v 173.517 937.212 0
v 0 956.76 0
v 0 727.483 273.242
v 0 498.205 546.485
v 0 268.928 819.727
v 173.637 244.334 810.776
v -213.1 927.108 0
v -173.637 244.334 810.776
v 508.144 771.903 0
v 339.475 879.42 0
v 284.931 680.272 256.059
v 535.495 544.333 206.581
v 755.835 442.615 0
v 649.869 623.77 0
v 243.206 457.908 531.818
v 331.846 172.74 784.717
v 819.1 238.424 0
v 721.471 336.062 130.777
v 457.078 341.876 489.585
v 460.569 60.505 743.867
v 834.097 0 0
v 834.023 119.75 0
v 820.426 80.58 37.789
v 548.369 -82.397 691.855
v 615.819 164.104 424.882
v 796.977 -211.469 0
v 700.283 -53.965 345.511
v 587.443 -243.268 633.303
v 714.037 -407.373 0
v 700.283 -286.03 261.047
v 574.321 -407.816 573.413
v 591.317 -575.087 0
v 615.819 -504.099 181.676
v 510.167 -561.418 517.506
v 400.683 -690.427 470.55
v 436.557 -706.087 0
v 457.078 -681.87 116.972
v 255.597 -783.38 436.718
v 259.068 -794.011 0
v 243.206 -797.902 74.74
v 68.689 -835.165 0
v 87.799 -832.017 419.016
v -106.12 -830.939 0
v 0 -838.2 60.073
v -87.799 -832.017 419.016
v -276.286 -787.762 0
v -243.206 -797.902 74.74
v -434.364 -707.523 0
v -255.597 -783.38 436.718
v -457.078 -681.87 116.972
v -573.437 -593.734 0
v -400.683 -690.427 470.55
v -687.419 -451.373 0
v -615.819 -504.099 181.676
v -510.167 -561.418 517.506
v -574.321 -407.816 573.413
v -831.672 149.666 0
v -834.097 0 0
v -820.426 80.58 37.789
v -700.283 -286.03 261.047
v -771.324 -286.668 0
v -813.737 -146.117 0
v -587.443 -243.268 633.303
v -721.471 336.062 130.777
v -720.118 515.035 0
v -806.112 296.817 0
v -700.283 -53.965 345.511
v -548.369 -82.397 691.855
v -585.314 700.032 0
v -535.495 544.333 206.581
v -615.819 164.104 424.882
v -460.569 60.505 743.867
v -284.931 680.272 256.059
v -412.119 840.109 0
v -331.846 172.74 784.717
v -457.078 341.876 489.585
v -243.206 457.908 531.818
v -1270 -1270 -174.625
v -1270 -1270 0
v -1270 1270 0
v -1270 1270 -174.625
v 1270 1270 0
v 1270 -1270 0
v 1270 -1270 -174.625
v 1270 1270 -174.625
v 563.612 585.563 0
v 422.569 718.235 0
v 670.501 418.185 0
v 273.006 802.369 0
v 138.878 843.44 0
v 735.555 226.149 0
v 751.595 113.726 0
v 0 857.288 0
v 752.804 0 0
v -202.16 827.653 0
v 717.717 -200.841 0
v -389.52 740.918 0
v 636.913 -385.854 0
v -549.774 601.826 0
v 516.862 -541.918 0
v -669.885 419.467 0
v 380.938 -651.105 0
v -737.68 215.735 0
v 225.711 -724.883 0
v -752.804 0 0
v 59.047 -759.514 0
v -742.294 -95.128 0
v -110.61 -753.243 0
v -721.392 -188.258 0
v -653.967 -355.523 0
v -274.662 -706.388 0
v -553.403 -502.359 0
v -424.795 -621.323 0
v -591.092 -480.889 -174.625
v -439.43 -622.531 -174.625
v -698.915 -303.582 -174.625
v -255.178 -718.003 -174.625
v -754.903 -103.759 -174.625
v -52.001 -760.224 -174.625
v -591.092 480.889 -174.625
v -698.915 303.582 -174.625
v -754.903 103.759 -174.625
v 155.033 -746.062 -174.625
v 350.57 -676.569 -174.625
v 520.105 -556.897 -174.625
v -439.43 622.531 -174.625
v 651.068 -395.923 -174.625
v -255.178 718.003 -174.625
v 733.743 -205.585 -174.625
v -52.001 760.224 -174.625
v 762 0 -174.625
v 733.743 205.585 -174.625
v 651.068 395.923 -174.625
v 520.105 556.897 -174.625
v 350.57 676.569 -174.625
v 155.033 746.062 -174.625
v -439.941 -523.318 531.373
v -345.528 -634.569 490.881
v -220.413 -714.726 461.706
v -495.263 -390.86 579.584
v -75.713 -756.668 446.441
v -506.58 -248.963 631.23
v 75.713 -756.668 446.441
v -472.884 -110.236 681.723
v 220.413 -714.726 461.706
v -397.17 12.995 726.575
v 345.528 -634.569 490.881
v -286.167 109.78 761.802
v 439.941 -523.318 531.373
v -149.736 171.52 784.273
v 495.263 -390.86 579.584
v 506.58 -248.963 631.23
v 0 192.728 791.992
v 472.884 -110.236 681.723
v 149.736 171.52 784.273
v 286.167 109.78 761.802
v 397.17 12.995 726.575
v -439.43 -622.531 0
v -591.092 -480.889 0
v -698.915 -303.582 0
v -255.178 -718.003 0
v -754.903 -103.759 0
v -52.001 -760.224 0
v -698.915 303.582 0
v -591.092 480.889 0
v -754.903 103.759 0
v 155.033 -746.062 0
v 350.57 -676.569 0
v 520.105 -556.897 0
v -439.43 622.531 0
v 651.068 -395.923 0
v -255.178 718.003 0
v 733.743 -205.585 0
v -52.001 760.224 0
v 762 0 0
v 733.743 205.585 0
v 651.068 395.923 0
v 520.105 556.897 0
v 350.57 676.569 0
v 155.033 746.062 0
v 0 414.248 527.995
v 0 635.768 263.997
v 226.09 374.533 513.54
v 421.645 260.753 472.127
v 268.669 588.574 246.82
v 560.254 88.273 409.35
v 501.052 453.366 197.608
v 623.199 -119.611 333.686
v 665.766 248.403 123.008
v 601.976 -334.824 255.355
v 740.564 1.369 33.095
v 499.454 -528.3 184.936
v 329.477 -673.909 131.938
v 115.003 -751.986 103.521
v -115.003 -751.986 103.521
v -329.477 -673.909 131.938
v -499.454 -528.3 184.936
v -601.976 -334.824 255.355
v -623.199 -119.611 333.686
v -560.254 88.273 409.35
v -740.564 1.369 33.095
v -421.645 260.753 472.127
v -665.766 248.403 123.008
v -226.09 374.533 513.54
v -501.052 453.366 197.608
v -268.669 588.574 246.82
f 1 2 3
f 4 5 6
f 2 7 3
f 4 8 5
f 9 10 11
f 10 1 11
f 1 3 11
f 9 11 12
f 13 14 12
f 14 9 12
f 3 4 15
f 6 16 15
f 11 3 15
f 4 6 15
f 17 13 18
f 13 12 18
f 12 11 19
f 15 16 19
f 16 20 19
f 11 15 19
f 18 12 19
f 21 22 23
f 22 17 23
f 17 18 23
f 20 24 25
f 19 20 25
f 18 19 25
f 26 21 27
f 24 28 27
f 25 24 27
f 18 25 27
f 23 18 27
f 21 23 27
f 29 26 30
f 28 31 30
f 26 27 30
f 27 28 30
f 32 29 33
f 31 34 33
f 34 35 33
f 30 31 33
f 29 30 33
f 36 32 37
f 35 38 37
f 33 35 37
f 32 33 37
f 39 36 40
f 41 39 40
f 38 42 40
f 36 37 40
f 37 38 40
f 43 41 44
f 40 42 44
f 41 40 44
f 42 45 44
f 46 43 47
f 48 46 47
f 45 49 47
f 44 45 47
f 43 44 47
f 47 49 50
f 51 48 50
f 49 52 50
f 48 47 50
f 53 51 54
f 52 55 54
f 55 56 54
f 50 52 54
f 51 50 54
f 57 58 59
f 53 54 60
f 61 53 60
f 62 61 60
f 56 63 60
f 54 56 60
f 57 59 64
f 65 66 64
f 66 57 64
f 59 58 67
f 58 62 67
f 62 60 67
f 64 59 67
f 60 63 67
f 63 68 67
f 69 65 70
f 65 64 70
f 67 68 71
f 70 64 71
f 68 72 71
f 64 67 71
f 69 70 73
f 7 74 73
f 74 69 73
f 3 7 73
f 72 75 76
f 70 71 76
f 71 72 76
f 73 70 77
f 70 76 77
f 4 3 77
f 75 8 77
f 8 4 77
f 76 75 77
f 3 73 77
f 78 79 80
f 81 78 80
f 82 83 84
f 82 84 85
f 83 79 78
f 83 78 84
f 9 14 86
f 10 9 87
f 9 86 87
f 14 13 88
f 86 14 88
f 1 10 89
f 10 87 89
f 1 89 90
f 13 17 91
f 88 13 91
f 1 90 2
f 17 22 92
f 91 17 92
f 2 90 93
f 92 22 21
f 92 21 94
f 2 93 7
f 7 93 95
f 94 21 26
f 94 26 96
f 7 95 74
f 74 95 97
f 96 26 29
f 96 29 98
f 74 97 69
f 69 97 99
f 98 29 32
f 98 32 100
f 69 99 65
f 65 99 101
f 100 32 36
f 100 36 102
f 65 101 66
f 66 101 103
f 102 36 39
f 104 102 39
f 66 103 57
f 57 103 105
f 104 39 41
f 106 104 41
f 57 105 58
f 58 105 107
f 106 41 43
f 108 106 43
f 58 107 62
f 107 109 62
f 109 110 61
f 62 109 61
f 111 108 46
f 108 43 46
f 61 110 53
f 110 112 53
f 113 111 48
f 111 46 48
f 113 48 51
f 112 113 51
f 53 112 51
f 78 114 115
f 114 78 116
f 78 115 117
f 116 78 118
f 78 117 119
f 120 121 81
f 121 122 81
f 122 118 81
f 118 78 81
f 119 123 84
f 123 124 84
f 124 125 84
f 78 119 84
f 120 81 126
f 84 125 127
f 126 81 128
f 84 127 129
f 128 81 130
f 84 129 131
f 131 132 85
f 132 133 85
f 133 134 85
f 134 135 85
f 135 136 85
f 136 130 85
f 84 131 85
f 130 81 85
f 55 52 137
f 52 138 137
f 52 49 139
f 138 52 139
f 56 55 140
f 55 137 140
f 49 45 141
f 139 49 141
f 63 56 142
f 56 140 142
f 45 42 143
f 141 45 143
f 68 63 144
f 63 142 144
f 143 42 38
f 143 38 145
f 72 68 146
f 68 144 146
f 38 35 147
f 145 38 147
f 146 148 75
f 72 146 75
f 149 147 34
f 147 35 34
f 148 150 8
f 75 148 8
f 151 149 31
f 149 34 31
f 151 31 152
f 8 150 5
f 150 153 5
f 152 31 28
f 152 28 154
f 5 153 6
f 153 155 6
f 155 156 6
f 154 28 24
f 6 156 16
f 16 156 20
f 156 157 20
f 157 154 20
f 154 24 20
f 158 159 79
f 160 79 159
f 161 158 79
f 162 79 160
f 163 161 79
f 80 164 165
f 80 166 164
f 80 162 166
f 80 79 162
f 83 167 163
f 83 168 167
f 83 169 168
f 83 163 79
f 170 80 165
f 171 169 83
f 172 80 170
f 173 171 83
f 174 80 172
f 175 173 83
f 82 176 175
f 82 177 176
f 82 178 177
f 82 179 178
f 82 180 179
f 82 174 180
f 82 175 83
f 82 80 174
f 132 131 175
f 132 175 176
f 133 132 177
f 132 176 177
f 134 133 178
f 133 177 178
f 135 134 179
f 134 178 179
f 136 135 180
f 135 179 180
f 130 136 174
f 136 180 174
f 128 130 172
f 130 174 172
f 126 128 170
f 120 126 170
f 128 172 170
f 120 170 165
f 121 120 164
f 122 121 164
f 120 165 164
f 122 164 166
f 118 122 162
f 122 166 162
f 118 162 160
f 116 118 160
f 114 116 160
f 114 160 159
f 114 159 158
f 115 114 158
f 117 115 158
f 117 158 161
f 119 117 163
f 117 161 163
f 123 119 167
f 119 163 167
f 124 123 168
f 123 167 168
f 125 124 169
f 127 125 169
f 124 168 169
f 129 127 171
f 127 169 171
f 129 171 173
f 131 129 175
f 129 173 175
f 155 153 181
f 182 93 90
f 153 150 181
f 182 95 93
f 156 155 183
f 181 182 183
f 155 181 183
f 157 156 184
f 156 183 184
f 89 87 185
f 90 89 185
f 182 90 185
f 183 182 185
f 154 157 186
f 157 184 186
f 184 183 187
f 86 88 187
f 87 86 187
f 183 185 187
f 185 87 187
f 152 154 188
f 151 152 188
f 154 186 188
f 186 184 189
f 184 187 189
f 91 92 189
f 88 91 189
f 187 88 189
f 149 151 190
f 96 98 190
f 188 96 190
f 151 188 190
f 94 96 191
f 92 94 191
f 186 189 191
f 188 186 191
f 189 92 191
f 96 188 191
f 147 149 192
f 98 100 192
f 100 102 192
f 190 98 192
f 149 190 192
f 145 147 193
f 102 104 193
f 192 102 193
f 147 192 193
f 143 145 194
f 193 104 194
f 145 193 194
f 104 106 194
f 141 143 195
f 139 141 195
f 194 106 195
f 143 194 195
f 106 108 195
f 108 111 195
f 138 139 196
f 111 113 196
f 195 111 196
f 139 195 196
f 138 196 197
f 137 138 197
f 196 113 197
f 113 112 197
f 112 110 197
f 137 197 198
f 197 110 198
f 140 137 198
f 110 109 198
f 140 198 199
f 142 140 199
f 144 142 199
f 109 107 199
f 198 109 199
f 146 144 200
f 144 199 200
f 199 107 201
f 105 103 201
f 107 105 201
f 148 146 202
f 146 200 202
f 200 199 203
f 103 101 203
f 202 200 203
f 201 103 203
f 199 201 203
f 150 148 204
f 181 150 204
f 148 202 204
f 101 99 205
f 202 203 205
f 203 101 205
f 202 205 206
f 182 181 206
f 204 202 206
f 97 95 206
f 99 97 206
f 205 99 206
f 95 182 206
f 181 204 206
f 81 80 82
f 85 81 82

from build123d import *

# Parameters (mm, degrees)
F8_DEPTH      = 956.7613239616
F8_DEPTH_BACK = 838.201
F9_W          = 2540
F9_H          = 2540
F9_R          = 762
F10_DEPTH     = 174.625


with BuildPart() as f6:
    # F5 (on Right) → F6 (revolve)
    with BuildSketch(Plane.YZ):
        Polygon((207.6453230735, 797.4220353942), (192.7277027185, 791.9924656189), (478.4467952241, 451.4857106525), (857.2882885145, 0), (956.7603239616, 0), (536.8193817898, 500.4661265106), (268.9277027185, 819.72699747), align=None)
    revolve(axis=Axis((0, -172.1245355458, 309.1231164047), (0, 0.3420201433, -0.9396926208)))

    # F7 (on Front) → F8 (cut, two sides)
    with BuildSketch(Plane.XZ) as f8_sk:
        Polygon((762, 0), (-762, 0), (-3048, 0), (-3048, -2540), (4572, -2540), (4572, 0), align=None)
    extrude(amount=-F8_DEPTH, mode=Mode.SUBTRACT)
    extrude(f8_sk.sketch, amount=F8_DEPTH_BACK, mode=Mode.SUBTRACT)


with BuildPart() as f10:
    # F9 (on Top) → F10 (new body)
    with BuildSketch(Plane.XY):
        Rectangle(F9_W, F9_H)
        Circle(F9_R, mode=Mode.SUBTRACT)
    extrude(amount=-F10_DEPTH)


solid = Compound([f6.part, f10.part])
